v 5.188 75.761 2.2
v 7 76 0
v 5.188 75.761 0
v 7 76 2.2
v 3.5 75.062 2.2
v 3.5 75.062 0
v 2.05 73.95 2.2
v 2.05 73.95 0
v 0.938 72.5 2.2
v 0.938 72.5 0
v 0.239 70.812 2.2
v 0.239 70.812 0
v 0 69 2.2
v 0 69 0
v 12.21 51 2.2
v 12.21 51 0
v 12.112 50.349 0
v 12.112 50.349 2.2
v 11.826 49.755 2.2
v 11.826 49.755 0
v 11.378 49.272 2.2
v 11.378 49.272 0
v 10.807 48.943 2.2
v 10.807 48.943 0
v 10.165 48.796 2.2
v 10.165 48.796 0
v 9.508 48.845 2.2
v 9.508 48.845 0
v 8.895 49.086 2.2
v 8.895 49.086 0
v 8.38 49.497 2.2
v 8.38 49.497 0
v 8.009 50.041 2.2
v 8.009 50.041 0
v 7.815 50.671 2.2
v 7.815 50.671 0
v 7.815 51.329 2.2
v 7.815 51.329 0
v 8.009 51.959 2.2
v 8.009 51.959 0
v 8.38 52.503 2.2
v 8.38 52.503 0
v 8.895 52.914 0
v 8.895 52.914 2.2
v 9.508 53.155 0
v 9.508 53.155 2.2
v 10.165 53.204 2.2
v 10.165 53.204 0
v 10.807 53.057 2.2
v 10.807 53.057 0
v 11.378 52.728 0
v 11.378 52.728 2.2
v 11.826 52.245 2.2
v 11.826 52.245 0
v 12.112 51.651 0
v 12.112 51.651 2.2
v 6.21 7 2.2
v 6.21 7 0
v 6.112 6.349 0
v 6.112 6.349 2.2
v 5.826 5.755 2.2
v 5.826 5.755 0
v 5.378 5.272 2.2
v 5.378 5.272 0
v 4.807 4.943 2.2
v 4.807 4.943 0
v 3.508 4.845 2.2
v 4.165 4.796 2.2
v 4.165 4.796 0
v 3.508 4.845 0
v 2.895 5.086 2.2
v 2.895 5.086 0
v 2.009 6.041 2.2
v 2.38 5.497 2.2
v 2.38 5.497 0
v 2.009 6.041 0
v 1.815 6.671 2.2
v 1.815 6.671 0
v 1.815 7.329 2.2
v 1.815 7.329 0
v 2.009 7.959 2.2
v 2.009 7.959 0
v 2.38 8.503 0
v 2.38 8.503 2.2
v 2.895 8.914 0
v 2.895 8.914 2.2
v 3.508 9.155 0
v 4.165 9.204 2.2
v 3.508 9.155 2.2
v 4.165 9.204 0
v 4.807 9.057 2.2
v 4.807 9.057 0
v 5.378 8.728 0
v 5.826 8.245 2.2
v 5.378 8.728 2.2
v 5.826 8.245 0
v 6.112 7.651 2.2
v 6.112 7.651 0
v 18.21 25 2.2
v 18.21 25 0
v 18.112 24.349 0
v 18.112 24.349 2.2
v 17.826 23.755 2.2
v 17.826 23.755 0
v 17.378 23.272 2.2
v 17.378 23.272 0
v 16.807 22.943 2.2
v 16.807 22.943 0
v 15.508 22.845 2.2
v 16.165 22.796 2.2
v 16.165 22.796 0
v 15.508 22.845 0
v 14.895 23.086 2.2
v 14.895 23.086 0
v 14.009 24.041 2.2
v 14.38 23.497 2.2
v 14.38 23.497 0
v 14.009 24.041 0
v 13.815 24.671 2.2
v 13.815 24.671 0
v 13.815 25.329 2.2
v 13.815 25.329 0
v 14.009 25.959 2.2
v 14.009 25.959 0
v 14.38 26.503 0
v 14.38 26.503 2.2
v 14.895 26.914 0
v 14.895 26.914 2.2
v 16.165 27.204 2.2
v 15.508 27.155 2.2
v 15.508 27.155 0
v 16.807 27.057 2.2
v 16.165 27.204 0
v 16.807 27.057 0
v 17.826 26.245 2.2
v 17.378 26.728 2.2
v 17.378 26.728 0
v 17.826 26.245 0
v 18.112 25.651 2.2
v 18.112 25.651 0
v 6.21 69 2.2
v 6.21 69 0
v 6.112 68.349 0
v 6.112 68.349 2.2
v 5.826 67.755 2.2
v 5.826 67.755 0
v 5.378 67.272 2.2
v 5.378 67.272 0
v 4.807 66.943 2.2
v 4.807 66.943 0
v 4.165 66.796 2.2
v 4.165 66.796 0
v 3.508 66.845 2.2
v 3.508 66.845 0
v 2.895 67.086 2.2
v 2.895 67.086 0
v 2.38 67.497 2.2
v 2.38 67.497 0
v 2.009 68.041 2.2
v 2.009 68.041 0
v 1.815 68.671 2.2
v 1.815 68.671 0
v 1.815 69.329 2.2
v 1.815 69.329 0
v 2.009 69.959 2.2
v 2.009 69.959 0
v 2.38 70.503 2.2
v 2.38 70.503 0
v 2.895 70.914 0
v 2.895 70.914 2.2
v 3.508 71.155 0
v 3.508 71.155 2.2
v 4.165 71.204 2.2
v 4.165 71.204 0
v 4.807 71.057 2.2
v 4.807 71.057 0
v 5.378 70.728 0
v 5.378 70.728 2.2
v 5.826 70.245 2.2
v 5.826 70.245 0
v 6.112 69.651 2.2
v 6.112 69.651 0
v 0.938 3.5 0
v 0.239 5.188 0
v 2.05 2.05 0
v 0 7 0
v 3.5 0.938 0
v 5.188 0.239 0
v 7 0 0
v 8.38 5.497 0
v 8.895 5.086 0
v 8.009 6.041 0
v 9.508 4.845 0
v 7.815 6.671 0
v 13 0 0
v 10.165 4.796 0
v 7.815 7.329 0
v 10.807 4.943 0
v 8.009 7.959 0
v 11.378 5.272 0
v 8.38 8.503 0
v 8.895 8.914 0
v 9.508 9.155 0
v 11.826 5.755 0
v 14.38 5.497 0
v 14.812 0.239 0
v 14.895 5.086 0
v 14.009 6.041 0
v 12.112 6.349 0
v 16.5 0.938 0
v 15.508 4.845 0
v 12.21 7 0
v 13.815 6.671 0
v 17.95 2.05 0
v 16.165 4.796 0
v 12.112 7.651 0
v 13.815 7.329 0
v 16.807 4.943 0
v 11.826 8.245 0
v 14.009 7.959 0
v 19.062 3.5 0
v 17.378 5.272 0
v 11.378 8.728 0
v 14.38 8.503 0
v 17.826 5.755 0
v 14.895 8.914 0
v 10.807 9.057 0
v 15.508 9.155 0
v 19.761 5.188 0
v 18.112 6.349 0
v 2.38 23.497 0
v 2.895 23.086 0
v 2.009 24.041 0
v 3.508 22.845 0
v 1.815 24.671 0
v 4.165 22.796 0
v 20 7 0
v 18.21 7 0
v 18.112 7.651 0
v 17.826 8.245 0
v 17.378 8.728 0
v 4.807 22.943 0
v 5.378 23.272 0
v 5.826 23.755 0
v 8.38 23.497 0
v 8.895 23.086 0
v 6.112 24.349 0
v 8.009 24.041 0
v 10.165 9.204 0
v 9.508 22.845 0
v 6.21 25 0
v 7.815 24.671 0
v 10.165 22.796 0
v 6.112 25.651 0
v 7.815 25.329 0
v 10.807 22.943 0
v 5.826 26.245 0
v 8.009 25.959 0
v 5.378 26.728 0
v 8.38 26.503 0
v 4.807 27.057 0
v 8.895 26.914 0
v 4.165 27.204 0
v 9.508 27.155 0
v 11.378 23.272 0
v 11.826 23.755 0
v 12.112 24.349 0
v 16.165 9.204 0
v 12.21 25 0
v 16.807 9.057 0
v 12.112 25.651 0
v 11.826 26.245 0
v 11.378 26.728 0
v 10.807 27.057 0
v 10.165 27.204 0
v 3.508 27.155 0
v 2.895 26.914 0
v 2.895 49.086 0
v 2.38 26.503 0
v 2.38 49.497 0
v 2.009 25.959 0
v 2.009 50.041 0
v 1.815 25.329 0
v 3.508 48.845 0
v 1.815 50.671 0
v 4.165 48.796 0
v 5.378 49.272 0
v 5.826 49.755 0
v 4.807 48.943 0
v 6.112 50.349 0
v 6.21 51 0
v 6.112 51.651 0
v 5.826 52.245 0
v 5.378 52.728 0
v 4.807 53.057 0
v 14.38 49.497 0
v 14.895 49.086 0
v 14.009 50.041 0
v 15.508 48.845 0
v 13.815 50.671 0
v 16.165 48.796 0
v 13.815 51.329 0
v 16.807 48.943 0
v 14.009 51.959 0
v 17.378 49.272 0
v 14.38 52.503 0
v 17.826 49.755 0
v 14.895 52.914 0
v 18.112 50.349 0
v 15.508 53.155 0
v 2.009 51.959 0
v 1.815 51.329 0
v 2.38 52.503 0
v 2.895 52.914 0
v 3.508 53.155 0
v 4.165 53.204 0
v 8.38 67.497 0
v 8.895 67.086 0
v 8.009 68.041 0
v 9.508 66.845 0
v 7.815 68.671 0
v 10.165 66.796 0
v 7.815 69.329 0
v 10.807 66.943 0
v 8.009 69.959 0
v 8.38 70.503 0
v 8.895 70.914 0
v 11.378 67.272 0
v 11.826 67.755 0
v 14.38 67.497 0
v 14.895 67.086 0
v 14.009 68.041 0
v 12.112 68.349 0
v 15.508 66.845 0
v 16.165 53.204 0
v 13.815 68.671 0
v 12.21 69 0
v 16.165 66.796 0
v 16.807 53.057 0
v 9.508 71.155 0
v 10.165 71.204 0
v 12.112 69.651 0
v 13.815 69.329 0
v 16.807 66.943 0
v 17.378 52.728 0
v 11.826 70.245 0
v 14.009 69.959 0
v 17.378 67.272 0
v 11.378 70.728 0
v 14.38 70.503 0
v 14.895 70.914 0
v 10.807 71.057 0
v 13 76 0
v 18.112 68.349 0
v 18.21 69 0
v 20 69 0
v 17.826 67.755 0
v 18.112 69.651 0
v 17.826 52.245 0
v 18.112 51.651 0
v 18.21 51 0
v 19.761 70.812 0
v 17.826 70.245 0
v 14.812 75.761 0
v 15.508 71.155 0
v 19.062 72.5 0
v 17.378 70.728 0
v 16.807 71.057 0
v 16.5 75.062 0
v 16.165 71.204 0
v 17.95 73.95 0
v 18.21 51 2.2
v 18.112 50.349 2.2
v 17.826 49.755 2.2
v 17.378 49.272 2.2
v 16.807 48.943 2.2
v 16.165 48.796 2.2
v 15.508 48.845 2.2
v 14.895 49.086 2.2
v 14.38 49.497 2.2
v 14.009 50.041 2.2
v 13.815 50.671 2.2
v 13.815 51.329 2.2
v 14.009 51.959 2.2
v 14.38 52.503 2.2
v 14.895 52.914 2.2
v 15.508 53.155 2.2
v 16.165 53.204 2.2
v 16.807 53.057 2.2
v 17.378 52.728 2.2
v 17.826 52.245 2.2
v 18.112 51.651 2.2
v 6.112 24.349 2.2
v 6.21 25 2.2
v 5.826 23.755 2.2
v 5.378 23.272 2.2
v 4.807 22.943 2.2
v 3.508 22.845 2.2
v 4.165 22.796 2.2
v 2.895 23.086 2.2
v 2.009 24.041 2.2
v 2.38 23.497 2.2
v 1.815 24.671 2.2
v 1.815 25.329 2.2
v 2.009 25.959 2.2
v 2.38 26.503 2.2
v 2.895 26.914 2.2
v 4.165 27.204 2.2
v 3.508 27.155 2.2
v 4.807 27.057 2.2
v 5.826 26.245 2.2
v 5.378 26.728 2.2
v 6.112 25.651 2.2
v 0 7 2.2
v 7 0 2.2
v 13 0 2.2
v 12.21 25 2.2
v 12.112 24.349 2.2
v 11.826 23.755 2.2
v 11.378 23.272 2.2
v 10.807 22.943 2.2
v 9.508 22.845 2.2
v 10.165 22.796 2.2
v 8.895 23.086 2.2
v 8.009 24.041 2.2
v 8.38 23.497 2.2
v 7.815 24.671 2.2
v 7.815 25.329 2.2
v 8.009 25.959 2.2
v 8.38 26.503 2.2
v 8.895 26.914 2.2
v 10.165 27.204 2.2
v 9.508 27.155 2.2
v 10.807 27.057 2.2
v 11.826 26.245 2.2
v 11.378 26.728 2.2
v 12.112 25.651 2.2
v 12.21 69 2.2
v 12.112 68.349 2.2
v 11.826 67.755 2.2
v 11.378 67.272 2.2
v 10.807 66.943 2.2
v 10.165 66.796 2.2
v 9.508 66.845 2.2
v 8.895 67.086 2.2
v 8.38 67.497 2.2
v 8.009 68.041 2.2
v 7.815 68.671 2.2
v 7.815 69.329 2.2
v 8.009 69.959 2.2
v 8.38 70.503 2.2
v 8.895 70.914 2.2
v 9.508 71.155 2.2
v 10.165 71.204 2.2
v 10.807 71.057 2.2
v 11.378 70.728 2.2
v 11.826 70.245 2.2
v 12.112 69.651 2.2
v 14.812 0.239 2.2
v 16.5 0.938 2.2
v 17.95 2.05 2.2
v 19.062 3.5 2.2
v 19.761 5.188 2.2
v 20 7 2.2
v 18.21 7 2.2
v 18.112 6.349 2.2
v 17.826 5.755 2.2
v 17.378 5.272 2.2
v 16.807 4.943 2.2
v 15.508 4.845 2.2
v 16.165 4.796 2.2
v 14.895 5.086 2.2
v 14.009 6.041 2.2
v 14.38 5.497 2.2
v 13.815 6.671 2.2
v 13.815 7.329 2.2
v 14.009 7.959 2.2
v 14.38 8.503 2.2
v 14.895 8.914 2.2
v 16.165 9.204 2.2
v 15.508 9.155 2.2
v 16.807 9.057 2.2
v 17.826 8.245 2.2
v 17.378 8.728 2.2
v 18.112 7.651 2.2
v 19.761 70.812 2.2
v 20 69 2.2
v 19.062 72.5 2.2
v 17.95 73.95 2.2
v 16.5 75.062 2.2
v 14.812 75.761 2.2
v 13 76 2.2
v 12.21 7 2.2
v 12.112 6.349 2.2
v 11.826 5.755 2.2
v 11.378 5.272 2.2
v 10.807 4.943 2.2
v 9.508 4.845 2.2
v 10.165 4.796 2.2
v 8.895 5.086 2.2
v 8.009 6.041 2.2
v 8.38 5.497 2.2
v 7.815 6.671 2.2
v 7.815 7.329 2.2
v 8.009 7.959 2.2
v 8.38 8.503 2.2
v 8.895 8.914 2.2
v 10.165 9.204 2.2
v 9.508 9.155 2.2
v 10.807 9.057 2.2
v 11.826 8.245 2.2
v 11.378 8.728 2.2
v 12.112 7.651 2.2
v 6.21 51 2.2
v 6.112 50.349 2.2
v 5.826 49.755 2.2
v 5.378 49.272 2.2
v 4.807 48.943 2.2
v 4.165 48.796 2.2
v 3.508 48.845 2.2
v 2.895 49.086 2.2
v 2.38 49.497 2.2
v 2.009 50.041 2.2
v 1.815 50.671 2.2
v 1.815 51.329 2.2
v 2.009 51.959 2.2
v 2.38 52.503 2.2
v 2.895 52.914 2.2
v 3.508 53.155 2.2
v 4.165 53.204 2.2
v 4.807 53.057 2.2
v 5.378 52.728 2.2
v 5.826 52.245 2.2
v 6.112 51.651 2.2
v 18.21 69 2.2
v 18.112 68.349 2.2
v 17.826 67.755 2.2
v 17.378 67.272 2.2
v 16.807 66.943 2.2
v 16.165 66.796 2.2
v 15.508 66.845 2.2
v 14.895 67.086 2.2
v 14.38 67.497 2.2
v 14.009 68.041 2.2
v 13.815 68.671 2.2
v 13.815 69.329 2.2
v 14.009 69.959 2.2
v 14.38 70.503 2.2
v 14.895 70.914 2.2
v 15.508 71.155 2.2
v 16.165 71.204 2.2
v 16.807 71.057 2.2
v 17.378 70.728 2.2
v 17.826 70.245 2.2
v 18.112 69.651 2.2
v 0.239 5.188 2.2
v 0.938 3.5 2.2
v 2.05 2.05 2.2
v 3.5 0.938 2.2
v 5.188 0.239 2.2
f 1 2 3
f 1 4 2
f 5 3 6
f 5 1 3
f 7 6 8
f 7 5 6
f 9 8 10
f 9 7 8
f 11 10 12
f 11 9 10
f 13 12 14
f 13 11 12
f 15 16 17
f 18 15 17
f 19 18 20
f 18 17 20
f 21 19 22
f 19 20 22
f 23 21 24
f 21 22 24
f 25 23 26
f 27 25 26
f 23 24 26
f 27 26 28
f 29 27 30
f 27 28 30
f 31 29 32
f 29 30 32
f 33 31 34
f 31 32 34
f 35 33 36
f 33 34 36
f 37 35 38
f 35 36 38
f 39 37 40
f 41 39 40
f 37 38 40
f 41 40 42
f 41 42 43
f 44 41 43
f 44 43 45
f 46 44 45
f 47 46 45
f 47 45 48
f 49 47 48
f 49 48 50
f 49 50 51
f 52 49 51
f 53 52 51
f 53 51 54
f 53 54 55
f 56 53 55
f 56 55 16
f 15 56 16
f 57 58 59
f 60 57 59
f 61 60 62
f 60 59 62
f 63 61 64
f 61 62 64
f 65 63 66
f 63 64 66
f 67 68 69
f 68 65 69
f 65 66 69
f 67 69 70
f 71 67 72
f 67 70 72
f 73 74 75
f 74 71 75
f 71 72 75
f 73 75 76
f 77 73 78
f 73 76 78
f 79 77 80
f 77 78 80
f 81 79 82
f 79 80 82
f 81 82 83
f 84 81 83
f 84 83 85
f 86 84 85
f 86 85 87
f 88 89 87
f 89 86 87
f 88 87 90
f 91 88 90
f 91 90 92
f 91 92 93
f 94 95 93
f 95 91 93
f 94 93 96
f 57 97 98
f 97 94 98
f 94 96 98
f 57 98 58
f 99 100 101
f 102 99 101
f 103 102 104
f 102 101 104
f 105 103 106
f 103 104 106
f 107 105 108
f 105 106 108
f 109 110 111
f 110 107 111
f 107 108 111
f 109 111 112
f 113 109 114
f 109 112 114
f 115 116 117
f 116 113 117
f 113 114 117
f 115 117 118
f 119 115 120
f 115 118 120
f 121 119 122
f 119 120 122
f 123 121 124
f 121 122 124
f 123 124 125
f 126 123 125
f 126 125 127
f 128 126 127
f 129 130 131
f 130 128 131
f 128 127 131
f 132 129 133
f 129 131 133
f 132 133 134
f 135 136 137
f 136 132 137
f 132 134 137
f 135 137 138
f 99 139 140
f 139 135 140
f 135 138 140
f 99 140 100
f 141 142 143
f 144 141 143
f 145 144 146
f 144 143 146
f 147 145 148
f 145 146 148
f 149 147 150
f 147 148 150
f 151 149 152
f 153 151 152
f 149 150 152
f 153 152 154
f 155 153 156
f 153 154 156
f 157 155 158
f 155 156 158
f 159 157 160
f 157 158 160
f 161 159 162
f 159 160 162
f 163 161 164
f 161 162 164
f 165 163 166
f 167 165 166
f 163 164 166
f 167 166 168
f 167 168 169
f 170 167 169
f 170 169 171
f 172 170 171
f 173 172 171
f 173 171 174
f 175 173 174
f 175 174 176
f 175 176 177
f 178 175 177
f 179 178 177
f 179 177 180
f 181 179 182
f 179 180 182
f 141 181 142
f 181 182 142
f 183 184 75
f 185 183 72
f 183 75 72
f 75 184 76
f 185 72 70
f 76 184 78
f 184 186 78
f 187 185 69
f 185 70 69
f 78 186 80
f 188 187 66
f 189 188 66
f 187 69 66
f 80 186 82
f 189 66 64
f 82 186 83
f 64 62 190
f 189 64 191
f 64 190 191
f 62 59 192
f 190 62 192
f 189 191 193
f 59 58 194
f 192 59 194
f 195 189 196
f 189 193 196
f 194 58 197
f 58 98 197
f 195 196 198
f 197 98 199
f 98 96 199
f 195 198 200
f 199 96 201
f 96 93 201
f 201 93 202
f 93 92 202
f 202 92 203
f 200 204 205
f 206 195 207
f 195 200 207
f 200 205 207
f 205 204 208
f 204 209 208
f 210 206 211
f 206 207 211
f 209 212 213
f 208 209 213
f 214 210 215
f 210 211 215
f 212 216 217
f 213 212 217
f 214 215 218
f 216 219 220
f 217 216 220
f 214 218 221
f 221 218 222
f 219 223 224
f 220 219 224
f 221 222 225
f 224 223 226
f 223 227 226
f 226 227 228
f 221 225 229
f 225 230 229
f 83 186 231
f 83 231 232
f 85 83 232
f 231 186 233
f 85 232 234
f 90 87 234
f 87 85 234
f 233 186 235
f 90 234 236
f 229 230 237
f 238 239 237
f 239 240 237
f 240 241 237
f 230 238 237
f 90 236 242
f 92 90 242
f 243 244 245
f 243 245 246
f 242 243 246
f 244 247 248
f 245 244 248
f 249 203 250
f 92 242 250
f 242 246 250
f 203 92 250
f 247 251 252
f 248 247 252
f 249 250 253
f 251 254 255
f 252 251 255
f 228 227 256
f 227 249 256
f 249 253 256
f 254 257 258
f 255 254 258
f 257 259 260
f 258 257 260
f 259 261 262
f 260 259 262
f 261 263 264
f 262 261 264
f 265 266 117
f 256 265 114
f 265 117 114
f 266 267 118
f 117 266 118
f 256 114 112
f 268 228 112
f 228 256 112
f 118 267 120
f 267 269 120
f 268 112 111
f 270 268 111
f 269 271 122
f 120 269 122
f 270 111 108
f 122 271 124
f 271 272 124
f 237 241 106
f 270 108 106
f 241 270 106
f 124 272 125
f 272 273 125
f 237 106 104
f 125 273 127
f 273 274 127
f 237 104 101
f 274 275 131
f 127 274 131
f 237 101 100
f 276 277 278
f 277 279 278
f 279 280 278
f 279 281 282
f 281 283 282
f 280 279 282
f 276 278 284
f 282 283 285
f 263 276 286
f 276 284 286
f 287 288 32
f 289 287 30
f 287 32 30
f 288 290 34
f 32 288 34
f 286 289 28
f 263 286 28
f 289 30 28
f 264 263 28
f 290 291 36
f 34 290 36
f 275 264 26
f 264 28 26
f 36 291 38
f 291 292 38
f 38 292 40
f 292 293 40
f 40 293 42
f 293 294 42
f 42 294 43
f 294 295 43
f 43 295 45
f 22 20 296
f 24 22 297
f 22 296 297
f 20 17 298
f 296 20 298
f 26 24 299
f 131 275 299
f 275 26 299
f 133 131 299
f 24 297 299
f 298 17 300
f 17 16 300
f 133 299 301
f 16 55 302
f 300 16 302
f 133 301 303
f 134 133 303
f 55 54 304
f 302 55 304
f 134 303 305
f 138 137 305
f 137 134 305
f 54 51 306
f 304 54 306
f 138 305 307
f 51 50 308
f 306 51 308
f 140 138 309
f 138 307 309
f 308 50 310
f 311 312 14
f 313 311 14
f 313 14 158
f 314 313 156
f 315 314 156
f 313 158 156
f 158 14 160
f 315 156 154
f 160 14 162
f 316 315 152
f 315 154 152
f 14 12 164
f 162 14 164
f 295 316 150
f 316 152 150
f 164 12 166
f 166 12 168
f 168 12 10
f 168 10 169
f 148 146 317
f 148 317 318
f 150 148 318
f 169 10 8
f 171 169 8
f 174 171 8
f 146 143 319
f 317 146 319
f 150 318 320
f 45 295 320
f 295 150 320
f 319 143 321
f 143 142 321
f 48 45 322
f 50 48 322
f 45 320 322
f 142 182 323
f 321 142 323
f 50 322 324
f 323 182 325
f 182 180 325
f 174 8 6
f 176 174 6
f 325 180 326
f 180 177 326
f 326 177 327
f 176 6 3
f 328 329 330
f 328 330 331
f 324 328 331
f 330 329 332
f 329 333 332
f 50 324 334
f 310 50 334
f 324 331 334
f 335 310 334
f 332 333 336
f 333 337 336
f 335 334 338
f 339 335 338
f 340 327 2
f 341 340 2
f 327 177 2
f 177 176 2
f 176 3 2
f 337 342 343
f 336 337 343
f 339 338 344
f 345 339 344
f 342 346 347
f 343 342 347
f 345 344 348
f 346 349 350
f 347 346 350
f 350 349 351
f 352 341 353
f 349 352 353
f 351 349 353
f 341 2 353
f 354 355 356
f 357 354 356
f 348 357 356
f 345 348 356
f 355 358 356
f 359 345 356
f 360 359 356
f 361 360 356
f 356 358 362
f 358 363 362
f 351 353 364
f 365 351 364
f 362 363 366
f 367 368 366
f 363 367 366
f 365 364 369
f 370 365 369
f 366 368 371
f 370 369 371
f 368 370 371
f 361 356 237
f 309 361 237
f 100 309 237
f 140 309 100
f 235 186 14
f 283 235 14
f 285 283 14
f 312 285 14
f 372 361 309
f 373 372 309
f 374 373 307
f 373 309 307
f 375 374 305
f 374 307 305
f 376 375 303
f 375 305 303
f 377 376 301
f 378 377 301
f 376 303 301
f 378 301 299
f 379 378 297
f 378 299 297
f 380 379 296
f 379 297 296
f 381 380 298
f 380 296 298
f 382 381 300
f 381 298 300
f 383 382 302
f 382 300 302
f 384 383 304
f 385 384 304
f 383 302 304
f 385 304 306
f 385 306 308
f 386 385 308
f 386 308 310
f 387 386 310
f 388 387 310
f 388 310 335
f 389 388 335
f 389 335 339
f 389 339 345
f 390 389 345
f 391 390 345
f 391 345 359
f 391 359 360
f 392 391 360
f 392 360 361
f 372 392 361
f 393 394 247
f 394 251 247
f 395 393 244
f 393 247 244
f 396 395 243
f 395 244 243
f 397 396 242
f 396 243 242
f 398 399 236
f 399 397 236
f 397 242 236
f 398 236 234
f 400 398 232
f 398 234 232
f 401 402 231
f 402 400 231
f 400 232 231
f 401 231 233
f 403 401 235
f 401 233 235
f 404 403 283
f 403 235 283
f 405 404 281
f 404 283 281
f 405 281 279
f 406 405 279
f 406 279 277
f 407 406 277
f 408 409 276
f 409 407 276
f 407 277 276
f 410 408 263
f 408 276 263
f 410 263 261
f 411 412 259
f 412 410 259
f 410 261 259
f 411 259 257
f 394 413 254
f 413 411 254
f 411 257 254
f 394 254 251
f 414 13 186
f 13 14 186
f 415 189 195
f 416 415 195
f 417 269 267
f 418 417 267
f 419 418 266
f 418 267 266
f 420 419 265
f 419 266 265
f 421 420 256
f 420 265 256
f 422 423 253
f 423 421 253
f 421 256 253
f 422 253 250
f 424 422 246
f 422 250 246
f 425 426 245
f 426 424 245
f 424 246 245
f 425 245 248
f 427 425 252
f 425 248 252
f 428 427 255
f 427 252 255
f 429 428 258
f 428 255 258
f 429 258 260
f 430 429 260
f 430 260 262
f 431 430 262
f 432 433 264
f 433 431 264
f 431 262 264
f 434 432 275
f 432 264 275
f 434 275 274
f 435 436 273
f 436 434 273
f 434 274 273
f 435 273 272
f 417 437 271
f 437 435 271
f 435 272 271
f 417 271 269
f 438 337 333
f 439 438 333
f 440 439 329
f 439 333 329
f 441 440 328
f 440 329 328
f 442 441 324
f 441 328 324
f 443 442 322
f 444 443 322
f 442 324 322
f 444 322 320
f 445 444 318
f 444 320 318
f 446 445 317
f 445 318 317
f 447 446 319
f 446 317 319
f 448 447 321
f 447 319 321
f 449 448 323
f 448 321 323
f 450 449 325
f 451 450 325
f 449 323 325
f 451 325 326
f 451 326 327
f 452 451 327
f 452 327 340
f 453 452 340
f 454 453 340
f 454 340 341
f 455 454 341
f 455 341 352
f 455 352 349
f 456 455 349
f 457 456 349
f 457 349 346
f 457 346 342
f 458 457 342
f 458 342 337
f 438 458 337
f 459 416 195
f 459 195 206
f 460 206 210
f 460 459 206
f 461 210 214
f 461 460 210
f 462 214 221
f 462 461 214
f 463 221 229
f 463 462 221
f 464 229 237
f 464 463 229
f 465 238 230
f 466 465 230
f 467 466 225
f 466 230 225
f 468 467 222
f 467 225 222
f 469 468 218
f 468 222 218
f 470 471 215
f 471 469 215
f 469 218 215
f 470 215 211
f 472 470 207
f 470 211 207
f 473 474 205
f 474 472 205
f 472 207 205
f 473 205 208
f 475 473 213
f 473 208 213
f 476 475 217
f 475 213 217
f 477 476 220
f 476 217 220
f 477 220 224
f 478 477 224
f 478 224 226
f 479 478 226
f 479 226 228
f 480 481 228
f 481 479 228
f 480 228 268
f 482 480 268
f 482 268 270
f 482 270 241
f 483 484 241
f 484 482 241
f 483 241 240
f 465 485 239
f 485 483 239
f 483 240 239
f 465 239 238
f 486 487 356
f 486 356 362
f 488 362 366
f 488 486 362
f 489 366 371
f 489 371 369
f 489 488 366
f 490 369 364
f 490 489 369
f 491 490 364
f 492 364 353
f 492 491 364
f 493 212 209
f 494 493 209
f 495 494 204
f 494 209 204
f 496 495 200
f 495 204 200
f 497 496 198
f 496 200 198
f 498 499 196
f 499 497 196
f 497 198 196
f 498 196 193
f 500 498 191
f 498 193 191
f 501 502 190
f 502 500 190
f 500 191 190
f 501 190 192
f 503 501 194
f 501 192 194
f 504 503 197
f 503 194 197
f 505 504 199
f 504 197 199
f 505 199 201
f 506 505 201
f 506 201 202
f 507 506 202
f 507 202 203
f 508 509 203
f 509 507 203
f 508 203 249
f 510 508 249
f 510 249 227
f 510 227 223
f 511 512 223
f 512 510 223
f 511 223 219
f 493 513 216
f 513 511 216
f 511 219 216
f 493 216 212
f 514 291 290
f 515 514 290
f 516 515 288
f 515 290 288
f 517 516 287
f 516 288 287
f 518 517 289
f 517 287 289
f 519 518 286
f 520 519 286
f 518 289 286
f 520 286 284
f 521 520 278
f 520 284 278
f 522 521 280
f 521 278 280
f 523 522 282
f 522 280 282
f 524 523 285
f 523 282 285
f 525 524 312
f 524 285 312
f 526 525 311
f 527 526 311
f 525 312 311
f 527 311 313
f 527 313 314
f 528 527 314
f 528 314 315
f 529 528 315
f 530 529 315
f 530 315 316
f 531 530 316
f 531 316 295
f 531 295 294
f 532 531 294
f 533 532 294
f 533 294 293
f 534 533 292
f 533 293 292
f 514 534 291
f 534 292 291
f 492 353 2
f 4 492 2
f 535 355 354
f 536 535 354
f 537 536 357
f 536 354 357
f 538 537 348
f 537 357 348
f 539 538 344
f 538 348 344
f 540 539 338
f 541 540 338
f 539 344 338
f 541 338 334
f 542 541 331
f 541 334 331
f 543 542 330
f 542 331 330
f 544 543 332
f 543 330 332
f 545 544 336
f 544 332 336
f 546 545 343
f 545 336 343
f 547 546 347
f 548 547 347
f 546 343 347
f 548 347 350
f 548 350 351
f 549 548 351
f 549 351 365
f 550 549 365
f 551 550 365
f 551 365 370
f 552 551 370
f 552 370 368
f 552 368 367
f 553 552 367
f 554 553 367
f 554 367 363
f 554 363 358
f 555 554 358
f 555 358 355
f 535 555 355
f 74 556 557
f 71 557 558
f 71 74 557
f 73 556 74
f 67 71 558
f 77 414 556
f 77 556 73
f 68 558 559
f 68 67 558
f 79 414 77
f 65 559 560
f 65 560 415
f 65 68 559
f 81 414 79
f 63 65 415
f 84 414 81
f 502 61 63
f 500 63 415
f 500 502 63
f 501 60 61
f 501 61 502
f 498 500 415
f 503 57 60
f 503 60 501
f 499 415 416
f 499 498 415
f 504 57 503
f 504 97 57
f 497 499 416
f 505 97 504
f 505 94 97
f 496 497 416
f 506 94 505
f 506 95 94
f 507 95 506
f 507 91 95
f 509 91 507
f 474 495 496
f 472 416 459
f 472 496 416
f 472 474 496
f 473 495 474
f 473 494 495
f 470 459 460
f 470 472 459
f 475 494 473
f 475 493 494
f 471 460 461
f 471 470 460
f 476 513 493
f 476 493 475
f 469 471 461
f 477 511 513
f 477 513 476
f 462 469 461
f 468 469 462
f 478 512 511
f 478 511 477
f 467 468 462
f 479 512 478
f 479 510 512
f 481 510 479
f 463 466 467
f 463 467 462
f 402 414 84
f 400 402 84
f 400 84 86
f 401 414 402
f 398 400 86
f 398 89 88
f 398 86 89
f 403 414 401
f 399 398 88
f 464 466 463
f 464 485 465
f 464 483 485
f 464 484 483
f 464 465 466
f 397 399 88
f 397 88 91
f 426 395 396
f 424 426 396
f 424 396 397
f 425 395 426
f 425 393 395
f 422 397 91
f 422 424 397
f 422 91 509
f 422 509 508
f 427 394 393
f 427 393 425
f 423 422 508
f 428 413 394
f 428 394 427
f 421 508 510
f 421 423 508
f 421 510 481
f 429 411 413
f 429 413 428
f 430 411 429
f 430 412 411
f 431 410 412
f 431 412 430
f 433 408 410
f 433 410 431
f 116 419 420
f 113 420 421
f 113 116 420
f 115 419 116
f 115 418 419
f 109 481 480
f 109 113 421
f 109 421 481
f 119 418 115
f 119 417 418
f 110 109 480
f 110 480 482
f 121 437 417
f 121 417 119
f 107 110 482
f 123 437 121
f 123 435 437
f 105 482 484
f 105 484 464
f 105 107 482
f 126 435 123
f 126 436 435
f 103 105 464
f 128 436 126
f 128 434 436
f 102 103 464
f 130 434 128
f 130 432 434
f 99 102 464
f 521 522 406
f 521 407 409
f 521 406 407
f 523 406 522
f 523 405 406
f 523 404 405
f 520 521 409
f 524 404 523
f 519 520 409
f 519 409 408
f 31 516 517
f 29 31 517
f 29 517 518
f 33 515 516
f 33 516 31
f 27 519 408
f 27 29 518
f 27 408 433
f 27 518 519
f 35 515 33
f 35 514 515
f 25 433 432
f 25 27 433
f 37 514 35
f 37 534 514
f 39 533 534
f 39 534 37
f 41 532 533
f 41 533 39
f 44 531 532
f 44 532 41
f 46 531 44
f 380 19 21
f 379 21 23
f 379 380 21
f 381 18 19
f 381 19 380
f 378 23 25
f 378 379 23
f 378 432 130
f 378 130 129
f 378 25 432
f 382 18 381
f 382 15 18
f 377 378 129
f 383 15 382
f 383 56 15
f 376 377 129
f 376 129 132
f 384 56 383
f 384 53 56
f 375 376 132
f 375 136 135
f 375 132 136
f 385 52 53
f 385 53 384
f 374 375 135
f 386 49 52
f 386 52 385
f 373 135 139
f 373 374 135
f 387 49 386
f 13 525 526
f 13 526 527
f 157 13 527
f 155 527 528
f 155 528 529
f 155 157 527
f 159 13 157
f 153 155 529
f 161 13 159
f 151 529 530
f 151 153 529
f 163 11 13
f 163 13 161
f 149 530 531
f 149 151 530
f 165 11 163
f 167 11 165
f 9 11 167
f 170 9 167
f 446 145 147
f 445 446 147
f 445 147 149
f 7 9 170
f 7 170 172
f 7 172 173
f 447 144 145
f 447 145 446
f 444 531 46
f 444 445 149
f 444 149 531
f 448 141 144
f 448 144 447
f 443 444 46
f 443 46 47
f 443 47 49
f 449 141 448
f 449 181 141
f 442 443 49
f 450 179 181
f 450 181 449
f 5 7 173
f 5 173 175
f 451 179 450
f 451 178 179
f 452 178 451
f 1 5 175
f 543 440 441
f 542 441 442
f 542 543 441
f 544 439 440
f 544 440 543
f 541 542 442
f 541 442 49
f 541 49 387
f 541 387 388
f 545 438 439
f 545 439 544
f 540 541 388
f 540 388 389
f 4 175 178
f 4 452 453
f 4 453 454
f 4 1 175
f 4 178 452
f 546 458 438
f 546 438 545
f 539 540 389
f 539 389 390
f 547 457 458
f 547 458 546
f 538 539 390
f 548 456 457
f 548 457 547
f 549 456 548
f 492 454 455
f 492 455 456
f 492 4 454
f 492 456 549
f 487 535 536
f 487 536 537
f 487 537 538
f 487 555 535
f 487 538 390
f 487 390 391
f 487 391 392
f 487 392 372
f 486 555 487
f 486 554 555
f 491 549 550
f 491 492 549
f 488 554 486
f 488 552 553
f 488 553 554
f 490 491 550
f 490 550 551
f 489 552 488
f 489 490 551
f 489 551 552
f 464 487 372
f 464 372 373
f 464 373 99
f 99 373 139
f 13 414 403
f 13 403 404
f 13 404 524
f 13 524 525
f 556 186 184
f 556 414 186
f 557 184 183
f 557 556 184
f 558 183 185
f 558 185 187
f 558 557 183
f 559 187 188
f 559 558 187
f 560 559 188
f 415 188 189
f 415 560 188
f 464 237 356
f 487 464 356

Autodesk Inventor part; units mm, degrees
ref_plane "YZ Plane" through (0, 0, 0) normal (1, 0, 0) x (0, 1, 0)
ref_plane "XZ Plane" through (0, 0, 0) normal (0, 1, 0) x (-1, 0, 0)
ref_plane "XY Plane" through (0, 0, 0) normal (0, 0, 1) x (1, 0, 0)
sketch "Esquisse12" plane through (0, 0, 0) normal (0, 0, 1) x (1, 0, 0)
  line L0 (0, 0) -> (20, 0)
  line L1 (20, 0) -> (20, 38)
  line L2 (20, 38) -> (0, 38)
  line L3 (0, 38) -> (0, 0)
  line L4 (10, 38) -> (10, 0) construction
  circle A0 centre (10, 7) radius 2.21
  line L5 (10, 7) -> (20, 7) construction
  circle A1 centre (16, 7) radius 2.21
  circle A2 centre (4, 7) radius 2.21
  circle A3 centre (10, 7) radius 2.21
  circle A4 centre (10, 25) radius 2.21
  circle A5 centre (16, 25) radius 2.21
  circle A6 centre (4, 25) radius 2.21
  dimension "d133" = 20
  dimension "d134" = 7
  dimension "d135" = 4.42
  dimension "d138" = 6
  dimension "d141" = 6
  dimension "d148" = 18
  dimension "d153" = 13
extrude "Extrusion13" add sketch "Esquisse12" along normal blind 2.2
fillet "Congé8" radius 7 2 edges at (20, 0, 1.1) (0, 0, 1.1)
mirror "Symétrie3" about plane through (20, 38, 0) normal (0, 1, 0)
equation "\"d135\" = Holes"
equation "\"d154\" = Depth"
equation "\"d156\" = Rounding"
equation "\"Depth\" = 2.2"
equation "\"Holes\" = 4.42"
equation "\"Height\" = 0"
equation "\"Rounding\" = 7"
properties part number "SideToSide"
